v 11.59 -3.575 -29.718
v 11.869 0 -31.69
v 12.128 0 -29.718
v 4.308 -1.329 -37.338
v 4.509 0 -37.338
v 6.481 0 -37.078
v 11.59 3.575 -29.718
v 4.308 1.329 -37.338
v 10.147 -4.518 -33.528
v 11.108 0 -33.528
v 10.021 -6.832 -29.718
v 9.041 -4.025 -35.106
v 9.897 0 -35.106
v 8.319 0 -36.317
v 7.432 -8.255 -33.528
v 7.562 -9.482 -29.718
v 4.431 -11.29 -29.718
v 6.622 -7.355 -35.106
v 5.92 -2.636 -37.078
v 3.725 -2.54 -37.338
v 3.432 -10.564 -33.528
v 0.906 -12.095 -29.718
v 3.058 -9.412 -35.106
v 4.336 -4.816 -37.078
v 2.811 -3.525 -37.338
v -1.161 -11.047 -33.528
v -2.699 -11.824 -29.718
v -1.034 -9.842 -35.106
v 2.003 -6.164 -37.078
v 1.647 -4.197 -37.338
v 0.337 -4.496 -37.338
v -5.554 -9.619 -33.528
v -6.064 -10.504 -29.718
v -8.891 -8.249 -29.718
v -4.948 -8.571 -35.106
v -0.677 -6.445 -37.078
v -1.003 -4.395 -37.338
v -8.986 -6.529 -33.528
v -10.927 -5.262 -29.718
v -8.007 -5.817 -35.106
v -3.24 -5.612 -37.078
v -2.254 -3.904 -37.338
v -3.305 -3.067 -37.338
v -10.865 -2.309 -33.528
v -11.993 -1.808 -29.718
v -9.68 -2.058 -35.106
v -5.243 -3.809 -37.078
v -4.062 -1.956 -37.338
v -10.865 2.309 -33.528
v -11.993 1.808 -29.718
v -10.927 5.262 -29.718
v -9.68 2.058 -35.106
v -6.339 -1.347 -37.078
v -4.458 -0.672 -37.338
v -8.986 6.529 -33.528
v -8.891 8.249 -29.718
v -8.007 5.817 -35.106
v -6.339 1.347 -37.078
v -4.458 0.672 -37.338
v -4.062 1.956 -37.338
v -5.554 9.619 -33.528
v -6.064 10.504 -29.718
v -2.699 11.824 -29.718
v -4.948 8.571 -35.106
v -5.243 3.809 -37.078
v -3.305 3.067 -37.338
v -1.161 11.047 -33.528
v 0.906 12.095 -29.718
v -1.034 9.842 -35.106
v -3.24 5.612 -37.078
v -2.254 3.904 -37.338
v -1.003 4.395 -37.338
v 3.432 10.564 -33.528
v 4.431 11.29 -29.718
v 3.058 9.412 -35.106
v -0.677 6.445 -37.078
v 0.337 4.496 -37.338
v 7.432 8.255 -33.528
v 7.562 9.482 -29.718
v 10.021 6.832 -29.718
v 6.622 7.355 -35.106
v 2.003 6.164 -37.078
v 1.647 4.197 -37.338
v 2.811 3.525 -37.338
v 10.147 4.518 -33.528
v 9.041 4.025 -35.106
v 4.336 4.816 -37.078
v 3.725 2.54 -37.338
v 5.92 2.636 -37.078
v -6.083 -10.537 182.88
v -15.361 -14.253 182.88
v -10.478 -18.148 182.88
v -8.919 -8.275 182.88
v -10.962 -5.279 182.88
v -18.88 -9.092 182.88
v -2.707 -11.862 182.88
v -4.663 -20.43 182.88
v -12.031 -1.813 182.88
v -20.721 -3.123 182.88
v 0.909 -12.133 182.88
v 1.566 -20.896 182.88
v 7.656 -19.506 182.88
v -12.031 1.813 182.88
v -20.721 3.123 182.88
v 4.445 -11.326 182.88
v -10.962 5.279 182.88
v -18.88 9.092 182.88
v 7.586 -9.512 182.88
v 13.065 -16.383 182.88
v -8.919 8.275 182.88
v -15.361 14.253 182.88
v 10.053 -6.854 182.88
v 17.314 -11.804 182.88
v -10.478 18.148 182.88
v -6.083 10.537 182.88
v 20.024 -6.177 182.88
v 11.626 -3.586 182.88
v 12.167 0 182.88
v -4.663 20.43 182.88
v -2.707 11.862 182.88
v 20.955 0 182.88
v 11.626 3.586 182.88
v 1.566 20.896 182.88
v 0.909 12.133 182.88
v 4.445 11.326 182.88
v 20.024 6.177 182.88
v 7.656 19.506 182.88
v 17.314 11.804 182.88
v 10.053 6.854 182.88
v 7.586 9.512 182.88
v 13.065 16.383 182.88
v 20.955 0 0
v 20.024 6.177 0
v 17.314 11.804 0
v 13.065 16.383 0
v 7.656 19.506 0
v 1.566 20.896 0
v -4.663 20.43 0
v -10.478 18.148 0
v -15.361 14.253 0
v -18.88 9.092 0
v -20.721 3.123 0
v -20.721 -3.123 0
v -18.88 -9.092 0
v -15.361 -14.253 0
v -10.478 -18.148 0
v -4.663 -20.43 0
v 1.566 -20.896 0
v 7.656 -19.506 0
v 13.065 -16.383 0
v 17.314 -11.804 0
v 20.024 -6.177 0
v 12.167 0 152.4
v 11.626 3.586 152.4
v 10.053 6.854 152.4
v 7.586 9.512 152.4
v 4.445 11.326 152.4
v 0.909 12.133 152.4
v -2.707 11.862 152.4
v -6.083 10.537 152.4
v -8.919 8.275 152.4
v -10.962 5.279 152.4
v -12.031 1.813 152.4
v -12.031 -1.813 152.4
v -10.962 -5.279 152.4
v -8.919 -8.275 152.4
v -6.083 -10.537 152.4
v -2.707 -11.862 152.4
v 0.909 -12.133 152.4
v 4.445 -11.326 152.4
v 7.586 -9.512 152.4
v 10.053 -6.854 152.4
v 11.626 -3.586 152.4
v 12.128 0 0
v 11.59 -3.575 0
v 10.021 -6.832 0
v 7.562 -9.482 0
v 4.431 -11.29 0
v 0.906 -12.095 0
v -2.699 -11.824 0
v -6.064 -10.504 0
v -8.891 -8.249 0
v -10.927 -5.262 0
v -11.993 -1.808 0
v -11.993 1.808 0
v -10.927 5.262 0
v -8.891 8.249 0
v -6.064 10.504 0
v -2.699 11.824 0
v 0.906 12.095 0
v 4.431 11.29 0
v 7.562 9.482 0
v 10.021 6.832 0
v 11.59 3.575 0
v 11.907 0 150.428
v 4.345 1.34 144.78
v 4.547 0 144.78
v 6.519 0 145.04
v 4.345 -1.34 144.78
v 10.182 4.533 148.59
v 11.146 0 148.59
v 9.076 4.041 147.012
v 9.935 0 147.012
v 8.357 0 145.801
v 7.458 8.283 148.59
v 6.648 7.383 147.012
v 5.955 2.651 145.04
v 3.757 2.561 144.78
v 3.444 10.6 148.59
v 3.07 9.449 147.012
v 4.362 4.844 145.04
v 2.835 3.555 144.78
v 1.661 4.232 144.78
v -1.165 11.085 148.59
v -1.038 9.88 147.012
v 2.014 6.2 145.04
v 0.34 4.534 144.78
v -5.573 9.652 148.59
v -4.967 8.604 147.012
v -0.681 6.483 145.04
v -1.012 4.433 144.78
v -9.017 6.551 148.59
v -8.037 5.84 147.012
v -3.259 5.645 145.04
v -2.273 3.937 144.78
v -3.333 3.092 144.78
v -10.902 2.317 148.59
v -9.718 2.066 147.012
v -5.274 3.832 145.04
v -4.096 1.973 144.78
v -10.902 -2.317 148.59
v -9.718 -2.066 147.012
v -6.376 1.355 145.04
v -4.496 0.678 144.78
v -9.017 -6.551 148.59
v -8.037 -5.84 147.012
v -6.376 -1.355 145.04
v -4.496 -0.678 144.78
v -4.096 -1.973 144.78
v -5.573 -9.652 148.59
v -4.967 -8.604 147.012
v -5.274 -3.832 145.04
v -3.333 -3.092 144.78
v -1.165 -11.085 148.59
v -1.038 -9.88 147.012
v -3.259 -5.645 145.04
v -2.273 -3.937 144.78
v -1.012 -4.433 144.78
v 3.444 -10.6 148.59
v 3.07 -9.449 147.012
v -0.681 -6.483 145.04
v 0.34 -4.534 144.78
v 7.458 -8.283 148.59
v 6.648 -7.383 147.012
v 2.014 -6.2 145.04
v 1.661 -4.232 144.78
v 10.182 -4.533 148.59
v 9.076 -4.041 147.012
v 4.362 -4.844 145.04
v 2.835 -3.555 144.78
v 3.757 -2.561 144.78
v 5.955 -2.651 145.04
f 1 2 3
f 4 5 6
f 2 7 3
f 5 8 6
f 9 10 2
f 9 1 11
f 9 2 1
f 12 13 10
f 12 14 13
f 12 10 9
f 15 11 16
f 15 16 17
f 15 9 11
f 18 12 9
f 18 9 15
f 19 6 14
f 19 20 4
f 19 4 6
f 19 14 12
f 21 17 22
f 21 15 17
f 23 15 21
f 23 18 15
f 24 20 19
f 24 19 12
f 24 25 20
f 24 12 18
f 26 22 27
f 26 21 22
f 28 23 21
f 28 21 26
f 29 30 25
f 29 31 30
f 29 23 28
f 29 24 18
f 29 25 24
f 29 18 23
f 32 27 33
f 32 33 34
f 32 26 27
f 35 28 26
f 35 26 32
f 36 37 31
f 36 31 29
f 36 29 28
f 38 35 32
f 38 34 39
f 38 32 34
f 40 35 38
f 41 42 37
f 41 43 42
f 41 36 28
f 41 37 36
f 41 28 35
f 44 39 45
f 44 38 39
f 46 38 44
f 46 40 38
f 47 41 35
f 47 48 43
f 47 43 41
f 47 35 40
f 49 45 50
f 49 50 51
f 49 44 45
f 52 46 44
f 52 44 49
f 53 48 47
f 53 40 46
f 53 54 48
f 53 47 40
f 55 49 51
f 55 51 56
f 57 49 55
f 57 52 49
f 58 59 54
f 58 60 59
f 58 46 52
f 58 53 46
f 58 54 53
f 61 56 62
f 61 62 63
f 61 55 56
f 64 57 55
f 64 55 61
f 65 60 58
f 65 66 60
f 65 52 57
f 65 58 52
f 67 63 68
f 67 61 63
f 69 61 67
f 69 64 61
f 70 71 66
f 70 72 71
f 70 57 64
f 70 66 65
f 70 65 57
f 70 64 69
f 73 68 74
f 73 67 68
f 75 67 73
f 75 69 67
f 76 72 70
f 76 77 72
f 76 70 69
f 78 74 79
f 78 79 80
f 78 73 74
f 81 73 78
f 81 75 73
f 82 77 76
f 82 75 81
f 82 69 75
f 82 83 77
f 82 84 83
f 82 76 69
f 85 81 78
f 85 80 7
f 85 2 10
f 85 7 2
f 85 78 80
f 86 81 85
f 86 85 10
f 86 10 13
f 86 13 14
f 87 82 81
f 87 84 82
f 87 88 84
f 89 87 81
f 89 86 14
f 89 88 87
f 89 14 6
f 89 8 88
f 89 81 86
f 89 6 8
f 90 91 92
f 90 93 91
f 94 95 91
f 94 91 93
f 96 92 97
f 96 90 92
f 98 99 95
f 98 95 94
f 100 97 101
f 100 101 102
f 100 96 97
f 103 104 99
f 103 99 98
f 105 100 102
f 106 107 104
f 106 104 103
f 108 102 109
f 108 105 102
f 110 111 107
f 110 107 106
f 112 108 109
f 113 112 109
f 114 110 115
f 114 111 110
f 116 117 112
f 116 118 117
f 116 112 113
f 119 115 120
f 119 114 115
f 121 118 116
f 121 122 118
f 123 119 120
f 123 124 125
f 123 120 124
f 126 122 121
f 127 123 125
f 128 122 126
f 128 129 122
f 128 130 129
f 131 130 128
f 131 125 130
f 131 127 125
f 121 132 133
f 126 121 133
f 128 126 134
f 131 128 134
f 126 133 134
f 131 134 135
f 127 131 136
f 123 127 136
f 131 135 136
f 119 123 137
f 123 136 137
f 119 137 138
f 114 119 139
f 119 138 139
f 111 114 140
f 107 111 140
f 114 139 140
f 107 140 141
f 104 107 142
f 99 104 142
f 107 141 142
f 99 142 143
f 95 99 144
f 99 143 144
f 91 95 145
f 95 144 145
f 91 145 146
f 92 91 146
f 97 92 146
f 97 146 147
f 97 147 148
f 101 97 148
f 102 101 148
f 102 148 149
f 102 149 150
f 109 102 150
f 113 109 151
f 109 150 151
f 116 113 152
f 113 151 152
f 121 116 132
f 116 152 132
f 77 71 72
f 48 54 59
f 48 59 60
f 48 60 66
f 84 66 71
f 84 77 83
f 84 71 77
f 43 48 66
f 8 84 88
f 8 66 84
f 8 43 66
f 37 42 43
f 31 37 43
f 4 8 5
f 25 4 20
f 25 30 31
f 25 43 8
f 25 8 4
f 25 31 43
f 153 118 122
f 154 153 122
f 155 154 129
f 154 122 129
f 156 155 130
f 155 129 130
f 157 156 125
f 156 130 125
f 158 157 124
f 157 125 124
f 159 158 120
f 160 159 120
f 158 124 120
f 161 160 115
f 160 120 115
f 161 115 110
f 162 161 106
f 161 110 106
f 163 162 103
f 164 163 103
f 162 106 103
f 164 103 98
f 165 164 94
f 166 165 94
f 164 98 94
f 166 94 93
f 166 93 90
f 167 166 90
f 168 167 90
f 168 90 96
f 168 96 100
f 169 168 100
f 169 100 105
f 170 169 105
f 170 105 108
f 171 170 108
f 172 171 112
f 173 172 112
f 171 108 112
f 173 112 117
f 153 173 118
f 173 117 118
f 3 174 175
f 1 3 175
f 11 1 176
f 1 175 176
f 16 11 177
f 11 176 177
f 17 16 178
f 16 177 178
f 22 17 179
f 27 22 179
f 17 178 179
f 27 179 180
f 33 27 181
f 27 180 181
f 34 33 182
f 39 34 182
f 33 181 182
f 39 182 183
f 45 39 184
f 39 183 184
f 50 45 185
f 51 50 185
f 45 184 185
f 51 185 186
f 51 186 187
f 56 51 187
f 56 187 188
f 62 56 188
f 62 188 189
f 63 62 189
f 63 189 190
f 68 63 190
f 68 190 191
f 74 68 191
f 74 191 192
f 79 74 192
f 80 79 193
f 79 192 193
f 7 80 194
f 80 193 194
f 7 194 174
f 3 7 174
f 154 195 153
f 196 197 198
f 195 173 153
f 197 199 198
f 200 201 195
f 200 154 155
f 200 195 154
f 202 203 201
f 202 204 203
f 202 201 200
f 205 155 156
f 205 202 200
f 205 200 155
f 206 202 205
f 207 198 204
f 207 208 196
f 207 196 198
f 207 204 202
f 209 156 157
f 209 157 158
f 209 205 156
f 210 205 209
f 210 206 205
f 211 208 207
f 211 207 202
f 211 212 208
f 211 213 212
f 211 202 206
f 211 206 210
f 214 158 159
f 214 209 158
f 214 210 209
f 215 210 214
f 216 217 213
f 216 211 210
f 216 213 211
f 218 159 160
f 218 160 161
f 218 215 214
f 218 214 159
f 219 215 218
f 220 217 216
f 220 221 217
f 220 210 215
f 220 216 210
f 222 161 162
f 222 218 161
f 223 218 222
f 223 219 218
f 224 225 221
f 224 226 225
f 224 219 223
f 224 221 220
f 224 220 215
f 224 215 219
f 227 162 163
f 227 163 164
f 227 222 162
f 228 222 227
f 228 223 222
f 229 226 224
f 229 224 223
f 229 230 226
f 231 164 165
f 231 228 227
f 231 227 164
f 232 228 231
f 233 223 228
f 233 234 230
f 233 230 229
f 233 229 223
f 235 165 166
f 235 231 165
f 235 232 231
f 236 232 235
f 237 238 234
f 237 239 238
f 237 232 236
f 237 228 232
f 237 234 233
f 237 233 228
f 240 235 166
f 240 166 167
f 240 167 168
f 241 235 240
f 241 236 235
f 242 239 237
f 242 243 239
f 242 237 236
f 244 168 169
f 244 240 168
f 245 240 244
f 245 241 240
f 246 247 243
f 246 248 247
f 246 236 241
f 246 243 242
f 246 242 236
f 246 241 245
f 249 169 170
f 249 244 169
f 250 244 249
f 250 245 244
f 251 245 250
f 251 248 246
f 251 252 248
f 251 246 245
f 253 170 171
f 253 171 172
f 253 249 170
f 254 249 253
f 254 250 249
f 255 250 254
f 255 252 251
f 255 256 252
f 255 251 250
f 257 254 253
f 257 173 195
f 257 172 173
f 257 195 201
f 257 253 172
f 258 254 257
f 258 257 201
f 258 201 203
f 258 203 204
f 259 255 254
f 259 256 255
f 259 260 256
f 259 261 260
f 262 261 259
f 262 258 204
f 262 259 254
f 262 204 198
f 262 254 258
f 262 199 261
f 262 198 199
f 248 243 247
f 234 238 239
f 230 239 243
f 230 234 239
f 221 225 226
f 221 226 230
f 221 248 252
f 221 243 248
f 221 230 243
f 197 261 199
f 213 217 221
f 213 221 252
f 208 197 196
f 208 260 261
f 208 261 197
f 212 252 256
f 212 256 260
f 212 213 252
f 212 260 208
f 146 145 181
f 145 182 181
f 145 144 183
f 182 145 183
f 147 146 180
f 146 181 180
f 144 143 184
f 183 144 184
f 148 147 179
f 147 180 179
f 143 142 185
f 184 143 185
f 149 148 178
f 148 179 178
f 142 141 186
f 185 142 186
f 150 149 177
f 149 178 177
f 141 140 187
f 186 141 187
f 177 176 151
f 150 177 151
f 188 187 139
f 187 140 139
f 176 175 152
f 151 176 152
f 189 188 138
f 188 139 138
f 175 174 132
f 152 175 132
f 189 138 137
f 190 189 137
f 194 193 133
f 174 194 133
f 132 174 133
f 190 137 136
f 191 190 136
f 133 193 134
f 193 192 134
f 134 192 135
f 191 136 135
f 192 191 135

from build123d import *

# Parameters (mm, degrees)
F0_R     = 20.955
F1_DEPTH = 182.88
F2_R     = 12.1285
F3_DEPTH = 37.338
F4_R     = 7.62
F5_R     = 12.1666
F6_DEPTH = 38.1
F7_R     = 7.62


with BuildPart() as f1:
    # F0 (on Top) → F1 (new body)
    with BuildSketch(Plane.XY):
        Circle(F0_R)
    extrude(amount=F1_DEPTH)

    # F2 (on face) → F3 (join)
    with BuildSketch(Plane(origin=(0, 0, 0), x_dir=(1, 0, 0), z_dir=(0, 0, -1))):
        Circle(F2_R)
    extrude(amount=F3_DEPTH)

    # F4
    f4_edges = [f1.edges().sort_by_distance(p)[0] for p in [
        (-12.1285, 0, -37.338),
    ]]
    fillet(f4_edges, radius=F4_R)

    # F5 (on face) → F6 (cut)
    with BuildSketch(Plane.XY.offset(182.88)):
        Circle(F5_R)
    extrude(amount=-F6_DEPTH, mode=Mode.SUBTRACT)

    # F7
    f7_edges = [f1.edges().sort_by_distance(p)[0] for p in [
        (-12.1666, 0, 144.78),
    ]]
    fillet(f7_edges, radius=F7_R)


solid = f1.part
